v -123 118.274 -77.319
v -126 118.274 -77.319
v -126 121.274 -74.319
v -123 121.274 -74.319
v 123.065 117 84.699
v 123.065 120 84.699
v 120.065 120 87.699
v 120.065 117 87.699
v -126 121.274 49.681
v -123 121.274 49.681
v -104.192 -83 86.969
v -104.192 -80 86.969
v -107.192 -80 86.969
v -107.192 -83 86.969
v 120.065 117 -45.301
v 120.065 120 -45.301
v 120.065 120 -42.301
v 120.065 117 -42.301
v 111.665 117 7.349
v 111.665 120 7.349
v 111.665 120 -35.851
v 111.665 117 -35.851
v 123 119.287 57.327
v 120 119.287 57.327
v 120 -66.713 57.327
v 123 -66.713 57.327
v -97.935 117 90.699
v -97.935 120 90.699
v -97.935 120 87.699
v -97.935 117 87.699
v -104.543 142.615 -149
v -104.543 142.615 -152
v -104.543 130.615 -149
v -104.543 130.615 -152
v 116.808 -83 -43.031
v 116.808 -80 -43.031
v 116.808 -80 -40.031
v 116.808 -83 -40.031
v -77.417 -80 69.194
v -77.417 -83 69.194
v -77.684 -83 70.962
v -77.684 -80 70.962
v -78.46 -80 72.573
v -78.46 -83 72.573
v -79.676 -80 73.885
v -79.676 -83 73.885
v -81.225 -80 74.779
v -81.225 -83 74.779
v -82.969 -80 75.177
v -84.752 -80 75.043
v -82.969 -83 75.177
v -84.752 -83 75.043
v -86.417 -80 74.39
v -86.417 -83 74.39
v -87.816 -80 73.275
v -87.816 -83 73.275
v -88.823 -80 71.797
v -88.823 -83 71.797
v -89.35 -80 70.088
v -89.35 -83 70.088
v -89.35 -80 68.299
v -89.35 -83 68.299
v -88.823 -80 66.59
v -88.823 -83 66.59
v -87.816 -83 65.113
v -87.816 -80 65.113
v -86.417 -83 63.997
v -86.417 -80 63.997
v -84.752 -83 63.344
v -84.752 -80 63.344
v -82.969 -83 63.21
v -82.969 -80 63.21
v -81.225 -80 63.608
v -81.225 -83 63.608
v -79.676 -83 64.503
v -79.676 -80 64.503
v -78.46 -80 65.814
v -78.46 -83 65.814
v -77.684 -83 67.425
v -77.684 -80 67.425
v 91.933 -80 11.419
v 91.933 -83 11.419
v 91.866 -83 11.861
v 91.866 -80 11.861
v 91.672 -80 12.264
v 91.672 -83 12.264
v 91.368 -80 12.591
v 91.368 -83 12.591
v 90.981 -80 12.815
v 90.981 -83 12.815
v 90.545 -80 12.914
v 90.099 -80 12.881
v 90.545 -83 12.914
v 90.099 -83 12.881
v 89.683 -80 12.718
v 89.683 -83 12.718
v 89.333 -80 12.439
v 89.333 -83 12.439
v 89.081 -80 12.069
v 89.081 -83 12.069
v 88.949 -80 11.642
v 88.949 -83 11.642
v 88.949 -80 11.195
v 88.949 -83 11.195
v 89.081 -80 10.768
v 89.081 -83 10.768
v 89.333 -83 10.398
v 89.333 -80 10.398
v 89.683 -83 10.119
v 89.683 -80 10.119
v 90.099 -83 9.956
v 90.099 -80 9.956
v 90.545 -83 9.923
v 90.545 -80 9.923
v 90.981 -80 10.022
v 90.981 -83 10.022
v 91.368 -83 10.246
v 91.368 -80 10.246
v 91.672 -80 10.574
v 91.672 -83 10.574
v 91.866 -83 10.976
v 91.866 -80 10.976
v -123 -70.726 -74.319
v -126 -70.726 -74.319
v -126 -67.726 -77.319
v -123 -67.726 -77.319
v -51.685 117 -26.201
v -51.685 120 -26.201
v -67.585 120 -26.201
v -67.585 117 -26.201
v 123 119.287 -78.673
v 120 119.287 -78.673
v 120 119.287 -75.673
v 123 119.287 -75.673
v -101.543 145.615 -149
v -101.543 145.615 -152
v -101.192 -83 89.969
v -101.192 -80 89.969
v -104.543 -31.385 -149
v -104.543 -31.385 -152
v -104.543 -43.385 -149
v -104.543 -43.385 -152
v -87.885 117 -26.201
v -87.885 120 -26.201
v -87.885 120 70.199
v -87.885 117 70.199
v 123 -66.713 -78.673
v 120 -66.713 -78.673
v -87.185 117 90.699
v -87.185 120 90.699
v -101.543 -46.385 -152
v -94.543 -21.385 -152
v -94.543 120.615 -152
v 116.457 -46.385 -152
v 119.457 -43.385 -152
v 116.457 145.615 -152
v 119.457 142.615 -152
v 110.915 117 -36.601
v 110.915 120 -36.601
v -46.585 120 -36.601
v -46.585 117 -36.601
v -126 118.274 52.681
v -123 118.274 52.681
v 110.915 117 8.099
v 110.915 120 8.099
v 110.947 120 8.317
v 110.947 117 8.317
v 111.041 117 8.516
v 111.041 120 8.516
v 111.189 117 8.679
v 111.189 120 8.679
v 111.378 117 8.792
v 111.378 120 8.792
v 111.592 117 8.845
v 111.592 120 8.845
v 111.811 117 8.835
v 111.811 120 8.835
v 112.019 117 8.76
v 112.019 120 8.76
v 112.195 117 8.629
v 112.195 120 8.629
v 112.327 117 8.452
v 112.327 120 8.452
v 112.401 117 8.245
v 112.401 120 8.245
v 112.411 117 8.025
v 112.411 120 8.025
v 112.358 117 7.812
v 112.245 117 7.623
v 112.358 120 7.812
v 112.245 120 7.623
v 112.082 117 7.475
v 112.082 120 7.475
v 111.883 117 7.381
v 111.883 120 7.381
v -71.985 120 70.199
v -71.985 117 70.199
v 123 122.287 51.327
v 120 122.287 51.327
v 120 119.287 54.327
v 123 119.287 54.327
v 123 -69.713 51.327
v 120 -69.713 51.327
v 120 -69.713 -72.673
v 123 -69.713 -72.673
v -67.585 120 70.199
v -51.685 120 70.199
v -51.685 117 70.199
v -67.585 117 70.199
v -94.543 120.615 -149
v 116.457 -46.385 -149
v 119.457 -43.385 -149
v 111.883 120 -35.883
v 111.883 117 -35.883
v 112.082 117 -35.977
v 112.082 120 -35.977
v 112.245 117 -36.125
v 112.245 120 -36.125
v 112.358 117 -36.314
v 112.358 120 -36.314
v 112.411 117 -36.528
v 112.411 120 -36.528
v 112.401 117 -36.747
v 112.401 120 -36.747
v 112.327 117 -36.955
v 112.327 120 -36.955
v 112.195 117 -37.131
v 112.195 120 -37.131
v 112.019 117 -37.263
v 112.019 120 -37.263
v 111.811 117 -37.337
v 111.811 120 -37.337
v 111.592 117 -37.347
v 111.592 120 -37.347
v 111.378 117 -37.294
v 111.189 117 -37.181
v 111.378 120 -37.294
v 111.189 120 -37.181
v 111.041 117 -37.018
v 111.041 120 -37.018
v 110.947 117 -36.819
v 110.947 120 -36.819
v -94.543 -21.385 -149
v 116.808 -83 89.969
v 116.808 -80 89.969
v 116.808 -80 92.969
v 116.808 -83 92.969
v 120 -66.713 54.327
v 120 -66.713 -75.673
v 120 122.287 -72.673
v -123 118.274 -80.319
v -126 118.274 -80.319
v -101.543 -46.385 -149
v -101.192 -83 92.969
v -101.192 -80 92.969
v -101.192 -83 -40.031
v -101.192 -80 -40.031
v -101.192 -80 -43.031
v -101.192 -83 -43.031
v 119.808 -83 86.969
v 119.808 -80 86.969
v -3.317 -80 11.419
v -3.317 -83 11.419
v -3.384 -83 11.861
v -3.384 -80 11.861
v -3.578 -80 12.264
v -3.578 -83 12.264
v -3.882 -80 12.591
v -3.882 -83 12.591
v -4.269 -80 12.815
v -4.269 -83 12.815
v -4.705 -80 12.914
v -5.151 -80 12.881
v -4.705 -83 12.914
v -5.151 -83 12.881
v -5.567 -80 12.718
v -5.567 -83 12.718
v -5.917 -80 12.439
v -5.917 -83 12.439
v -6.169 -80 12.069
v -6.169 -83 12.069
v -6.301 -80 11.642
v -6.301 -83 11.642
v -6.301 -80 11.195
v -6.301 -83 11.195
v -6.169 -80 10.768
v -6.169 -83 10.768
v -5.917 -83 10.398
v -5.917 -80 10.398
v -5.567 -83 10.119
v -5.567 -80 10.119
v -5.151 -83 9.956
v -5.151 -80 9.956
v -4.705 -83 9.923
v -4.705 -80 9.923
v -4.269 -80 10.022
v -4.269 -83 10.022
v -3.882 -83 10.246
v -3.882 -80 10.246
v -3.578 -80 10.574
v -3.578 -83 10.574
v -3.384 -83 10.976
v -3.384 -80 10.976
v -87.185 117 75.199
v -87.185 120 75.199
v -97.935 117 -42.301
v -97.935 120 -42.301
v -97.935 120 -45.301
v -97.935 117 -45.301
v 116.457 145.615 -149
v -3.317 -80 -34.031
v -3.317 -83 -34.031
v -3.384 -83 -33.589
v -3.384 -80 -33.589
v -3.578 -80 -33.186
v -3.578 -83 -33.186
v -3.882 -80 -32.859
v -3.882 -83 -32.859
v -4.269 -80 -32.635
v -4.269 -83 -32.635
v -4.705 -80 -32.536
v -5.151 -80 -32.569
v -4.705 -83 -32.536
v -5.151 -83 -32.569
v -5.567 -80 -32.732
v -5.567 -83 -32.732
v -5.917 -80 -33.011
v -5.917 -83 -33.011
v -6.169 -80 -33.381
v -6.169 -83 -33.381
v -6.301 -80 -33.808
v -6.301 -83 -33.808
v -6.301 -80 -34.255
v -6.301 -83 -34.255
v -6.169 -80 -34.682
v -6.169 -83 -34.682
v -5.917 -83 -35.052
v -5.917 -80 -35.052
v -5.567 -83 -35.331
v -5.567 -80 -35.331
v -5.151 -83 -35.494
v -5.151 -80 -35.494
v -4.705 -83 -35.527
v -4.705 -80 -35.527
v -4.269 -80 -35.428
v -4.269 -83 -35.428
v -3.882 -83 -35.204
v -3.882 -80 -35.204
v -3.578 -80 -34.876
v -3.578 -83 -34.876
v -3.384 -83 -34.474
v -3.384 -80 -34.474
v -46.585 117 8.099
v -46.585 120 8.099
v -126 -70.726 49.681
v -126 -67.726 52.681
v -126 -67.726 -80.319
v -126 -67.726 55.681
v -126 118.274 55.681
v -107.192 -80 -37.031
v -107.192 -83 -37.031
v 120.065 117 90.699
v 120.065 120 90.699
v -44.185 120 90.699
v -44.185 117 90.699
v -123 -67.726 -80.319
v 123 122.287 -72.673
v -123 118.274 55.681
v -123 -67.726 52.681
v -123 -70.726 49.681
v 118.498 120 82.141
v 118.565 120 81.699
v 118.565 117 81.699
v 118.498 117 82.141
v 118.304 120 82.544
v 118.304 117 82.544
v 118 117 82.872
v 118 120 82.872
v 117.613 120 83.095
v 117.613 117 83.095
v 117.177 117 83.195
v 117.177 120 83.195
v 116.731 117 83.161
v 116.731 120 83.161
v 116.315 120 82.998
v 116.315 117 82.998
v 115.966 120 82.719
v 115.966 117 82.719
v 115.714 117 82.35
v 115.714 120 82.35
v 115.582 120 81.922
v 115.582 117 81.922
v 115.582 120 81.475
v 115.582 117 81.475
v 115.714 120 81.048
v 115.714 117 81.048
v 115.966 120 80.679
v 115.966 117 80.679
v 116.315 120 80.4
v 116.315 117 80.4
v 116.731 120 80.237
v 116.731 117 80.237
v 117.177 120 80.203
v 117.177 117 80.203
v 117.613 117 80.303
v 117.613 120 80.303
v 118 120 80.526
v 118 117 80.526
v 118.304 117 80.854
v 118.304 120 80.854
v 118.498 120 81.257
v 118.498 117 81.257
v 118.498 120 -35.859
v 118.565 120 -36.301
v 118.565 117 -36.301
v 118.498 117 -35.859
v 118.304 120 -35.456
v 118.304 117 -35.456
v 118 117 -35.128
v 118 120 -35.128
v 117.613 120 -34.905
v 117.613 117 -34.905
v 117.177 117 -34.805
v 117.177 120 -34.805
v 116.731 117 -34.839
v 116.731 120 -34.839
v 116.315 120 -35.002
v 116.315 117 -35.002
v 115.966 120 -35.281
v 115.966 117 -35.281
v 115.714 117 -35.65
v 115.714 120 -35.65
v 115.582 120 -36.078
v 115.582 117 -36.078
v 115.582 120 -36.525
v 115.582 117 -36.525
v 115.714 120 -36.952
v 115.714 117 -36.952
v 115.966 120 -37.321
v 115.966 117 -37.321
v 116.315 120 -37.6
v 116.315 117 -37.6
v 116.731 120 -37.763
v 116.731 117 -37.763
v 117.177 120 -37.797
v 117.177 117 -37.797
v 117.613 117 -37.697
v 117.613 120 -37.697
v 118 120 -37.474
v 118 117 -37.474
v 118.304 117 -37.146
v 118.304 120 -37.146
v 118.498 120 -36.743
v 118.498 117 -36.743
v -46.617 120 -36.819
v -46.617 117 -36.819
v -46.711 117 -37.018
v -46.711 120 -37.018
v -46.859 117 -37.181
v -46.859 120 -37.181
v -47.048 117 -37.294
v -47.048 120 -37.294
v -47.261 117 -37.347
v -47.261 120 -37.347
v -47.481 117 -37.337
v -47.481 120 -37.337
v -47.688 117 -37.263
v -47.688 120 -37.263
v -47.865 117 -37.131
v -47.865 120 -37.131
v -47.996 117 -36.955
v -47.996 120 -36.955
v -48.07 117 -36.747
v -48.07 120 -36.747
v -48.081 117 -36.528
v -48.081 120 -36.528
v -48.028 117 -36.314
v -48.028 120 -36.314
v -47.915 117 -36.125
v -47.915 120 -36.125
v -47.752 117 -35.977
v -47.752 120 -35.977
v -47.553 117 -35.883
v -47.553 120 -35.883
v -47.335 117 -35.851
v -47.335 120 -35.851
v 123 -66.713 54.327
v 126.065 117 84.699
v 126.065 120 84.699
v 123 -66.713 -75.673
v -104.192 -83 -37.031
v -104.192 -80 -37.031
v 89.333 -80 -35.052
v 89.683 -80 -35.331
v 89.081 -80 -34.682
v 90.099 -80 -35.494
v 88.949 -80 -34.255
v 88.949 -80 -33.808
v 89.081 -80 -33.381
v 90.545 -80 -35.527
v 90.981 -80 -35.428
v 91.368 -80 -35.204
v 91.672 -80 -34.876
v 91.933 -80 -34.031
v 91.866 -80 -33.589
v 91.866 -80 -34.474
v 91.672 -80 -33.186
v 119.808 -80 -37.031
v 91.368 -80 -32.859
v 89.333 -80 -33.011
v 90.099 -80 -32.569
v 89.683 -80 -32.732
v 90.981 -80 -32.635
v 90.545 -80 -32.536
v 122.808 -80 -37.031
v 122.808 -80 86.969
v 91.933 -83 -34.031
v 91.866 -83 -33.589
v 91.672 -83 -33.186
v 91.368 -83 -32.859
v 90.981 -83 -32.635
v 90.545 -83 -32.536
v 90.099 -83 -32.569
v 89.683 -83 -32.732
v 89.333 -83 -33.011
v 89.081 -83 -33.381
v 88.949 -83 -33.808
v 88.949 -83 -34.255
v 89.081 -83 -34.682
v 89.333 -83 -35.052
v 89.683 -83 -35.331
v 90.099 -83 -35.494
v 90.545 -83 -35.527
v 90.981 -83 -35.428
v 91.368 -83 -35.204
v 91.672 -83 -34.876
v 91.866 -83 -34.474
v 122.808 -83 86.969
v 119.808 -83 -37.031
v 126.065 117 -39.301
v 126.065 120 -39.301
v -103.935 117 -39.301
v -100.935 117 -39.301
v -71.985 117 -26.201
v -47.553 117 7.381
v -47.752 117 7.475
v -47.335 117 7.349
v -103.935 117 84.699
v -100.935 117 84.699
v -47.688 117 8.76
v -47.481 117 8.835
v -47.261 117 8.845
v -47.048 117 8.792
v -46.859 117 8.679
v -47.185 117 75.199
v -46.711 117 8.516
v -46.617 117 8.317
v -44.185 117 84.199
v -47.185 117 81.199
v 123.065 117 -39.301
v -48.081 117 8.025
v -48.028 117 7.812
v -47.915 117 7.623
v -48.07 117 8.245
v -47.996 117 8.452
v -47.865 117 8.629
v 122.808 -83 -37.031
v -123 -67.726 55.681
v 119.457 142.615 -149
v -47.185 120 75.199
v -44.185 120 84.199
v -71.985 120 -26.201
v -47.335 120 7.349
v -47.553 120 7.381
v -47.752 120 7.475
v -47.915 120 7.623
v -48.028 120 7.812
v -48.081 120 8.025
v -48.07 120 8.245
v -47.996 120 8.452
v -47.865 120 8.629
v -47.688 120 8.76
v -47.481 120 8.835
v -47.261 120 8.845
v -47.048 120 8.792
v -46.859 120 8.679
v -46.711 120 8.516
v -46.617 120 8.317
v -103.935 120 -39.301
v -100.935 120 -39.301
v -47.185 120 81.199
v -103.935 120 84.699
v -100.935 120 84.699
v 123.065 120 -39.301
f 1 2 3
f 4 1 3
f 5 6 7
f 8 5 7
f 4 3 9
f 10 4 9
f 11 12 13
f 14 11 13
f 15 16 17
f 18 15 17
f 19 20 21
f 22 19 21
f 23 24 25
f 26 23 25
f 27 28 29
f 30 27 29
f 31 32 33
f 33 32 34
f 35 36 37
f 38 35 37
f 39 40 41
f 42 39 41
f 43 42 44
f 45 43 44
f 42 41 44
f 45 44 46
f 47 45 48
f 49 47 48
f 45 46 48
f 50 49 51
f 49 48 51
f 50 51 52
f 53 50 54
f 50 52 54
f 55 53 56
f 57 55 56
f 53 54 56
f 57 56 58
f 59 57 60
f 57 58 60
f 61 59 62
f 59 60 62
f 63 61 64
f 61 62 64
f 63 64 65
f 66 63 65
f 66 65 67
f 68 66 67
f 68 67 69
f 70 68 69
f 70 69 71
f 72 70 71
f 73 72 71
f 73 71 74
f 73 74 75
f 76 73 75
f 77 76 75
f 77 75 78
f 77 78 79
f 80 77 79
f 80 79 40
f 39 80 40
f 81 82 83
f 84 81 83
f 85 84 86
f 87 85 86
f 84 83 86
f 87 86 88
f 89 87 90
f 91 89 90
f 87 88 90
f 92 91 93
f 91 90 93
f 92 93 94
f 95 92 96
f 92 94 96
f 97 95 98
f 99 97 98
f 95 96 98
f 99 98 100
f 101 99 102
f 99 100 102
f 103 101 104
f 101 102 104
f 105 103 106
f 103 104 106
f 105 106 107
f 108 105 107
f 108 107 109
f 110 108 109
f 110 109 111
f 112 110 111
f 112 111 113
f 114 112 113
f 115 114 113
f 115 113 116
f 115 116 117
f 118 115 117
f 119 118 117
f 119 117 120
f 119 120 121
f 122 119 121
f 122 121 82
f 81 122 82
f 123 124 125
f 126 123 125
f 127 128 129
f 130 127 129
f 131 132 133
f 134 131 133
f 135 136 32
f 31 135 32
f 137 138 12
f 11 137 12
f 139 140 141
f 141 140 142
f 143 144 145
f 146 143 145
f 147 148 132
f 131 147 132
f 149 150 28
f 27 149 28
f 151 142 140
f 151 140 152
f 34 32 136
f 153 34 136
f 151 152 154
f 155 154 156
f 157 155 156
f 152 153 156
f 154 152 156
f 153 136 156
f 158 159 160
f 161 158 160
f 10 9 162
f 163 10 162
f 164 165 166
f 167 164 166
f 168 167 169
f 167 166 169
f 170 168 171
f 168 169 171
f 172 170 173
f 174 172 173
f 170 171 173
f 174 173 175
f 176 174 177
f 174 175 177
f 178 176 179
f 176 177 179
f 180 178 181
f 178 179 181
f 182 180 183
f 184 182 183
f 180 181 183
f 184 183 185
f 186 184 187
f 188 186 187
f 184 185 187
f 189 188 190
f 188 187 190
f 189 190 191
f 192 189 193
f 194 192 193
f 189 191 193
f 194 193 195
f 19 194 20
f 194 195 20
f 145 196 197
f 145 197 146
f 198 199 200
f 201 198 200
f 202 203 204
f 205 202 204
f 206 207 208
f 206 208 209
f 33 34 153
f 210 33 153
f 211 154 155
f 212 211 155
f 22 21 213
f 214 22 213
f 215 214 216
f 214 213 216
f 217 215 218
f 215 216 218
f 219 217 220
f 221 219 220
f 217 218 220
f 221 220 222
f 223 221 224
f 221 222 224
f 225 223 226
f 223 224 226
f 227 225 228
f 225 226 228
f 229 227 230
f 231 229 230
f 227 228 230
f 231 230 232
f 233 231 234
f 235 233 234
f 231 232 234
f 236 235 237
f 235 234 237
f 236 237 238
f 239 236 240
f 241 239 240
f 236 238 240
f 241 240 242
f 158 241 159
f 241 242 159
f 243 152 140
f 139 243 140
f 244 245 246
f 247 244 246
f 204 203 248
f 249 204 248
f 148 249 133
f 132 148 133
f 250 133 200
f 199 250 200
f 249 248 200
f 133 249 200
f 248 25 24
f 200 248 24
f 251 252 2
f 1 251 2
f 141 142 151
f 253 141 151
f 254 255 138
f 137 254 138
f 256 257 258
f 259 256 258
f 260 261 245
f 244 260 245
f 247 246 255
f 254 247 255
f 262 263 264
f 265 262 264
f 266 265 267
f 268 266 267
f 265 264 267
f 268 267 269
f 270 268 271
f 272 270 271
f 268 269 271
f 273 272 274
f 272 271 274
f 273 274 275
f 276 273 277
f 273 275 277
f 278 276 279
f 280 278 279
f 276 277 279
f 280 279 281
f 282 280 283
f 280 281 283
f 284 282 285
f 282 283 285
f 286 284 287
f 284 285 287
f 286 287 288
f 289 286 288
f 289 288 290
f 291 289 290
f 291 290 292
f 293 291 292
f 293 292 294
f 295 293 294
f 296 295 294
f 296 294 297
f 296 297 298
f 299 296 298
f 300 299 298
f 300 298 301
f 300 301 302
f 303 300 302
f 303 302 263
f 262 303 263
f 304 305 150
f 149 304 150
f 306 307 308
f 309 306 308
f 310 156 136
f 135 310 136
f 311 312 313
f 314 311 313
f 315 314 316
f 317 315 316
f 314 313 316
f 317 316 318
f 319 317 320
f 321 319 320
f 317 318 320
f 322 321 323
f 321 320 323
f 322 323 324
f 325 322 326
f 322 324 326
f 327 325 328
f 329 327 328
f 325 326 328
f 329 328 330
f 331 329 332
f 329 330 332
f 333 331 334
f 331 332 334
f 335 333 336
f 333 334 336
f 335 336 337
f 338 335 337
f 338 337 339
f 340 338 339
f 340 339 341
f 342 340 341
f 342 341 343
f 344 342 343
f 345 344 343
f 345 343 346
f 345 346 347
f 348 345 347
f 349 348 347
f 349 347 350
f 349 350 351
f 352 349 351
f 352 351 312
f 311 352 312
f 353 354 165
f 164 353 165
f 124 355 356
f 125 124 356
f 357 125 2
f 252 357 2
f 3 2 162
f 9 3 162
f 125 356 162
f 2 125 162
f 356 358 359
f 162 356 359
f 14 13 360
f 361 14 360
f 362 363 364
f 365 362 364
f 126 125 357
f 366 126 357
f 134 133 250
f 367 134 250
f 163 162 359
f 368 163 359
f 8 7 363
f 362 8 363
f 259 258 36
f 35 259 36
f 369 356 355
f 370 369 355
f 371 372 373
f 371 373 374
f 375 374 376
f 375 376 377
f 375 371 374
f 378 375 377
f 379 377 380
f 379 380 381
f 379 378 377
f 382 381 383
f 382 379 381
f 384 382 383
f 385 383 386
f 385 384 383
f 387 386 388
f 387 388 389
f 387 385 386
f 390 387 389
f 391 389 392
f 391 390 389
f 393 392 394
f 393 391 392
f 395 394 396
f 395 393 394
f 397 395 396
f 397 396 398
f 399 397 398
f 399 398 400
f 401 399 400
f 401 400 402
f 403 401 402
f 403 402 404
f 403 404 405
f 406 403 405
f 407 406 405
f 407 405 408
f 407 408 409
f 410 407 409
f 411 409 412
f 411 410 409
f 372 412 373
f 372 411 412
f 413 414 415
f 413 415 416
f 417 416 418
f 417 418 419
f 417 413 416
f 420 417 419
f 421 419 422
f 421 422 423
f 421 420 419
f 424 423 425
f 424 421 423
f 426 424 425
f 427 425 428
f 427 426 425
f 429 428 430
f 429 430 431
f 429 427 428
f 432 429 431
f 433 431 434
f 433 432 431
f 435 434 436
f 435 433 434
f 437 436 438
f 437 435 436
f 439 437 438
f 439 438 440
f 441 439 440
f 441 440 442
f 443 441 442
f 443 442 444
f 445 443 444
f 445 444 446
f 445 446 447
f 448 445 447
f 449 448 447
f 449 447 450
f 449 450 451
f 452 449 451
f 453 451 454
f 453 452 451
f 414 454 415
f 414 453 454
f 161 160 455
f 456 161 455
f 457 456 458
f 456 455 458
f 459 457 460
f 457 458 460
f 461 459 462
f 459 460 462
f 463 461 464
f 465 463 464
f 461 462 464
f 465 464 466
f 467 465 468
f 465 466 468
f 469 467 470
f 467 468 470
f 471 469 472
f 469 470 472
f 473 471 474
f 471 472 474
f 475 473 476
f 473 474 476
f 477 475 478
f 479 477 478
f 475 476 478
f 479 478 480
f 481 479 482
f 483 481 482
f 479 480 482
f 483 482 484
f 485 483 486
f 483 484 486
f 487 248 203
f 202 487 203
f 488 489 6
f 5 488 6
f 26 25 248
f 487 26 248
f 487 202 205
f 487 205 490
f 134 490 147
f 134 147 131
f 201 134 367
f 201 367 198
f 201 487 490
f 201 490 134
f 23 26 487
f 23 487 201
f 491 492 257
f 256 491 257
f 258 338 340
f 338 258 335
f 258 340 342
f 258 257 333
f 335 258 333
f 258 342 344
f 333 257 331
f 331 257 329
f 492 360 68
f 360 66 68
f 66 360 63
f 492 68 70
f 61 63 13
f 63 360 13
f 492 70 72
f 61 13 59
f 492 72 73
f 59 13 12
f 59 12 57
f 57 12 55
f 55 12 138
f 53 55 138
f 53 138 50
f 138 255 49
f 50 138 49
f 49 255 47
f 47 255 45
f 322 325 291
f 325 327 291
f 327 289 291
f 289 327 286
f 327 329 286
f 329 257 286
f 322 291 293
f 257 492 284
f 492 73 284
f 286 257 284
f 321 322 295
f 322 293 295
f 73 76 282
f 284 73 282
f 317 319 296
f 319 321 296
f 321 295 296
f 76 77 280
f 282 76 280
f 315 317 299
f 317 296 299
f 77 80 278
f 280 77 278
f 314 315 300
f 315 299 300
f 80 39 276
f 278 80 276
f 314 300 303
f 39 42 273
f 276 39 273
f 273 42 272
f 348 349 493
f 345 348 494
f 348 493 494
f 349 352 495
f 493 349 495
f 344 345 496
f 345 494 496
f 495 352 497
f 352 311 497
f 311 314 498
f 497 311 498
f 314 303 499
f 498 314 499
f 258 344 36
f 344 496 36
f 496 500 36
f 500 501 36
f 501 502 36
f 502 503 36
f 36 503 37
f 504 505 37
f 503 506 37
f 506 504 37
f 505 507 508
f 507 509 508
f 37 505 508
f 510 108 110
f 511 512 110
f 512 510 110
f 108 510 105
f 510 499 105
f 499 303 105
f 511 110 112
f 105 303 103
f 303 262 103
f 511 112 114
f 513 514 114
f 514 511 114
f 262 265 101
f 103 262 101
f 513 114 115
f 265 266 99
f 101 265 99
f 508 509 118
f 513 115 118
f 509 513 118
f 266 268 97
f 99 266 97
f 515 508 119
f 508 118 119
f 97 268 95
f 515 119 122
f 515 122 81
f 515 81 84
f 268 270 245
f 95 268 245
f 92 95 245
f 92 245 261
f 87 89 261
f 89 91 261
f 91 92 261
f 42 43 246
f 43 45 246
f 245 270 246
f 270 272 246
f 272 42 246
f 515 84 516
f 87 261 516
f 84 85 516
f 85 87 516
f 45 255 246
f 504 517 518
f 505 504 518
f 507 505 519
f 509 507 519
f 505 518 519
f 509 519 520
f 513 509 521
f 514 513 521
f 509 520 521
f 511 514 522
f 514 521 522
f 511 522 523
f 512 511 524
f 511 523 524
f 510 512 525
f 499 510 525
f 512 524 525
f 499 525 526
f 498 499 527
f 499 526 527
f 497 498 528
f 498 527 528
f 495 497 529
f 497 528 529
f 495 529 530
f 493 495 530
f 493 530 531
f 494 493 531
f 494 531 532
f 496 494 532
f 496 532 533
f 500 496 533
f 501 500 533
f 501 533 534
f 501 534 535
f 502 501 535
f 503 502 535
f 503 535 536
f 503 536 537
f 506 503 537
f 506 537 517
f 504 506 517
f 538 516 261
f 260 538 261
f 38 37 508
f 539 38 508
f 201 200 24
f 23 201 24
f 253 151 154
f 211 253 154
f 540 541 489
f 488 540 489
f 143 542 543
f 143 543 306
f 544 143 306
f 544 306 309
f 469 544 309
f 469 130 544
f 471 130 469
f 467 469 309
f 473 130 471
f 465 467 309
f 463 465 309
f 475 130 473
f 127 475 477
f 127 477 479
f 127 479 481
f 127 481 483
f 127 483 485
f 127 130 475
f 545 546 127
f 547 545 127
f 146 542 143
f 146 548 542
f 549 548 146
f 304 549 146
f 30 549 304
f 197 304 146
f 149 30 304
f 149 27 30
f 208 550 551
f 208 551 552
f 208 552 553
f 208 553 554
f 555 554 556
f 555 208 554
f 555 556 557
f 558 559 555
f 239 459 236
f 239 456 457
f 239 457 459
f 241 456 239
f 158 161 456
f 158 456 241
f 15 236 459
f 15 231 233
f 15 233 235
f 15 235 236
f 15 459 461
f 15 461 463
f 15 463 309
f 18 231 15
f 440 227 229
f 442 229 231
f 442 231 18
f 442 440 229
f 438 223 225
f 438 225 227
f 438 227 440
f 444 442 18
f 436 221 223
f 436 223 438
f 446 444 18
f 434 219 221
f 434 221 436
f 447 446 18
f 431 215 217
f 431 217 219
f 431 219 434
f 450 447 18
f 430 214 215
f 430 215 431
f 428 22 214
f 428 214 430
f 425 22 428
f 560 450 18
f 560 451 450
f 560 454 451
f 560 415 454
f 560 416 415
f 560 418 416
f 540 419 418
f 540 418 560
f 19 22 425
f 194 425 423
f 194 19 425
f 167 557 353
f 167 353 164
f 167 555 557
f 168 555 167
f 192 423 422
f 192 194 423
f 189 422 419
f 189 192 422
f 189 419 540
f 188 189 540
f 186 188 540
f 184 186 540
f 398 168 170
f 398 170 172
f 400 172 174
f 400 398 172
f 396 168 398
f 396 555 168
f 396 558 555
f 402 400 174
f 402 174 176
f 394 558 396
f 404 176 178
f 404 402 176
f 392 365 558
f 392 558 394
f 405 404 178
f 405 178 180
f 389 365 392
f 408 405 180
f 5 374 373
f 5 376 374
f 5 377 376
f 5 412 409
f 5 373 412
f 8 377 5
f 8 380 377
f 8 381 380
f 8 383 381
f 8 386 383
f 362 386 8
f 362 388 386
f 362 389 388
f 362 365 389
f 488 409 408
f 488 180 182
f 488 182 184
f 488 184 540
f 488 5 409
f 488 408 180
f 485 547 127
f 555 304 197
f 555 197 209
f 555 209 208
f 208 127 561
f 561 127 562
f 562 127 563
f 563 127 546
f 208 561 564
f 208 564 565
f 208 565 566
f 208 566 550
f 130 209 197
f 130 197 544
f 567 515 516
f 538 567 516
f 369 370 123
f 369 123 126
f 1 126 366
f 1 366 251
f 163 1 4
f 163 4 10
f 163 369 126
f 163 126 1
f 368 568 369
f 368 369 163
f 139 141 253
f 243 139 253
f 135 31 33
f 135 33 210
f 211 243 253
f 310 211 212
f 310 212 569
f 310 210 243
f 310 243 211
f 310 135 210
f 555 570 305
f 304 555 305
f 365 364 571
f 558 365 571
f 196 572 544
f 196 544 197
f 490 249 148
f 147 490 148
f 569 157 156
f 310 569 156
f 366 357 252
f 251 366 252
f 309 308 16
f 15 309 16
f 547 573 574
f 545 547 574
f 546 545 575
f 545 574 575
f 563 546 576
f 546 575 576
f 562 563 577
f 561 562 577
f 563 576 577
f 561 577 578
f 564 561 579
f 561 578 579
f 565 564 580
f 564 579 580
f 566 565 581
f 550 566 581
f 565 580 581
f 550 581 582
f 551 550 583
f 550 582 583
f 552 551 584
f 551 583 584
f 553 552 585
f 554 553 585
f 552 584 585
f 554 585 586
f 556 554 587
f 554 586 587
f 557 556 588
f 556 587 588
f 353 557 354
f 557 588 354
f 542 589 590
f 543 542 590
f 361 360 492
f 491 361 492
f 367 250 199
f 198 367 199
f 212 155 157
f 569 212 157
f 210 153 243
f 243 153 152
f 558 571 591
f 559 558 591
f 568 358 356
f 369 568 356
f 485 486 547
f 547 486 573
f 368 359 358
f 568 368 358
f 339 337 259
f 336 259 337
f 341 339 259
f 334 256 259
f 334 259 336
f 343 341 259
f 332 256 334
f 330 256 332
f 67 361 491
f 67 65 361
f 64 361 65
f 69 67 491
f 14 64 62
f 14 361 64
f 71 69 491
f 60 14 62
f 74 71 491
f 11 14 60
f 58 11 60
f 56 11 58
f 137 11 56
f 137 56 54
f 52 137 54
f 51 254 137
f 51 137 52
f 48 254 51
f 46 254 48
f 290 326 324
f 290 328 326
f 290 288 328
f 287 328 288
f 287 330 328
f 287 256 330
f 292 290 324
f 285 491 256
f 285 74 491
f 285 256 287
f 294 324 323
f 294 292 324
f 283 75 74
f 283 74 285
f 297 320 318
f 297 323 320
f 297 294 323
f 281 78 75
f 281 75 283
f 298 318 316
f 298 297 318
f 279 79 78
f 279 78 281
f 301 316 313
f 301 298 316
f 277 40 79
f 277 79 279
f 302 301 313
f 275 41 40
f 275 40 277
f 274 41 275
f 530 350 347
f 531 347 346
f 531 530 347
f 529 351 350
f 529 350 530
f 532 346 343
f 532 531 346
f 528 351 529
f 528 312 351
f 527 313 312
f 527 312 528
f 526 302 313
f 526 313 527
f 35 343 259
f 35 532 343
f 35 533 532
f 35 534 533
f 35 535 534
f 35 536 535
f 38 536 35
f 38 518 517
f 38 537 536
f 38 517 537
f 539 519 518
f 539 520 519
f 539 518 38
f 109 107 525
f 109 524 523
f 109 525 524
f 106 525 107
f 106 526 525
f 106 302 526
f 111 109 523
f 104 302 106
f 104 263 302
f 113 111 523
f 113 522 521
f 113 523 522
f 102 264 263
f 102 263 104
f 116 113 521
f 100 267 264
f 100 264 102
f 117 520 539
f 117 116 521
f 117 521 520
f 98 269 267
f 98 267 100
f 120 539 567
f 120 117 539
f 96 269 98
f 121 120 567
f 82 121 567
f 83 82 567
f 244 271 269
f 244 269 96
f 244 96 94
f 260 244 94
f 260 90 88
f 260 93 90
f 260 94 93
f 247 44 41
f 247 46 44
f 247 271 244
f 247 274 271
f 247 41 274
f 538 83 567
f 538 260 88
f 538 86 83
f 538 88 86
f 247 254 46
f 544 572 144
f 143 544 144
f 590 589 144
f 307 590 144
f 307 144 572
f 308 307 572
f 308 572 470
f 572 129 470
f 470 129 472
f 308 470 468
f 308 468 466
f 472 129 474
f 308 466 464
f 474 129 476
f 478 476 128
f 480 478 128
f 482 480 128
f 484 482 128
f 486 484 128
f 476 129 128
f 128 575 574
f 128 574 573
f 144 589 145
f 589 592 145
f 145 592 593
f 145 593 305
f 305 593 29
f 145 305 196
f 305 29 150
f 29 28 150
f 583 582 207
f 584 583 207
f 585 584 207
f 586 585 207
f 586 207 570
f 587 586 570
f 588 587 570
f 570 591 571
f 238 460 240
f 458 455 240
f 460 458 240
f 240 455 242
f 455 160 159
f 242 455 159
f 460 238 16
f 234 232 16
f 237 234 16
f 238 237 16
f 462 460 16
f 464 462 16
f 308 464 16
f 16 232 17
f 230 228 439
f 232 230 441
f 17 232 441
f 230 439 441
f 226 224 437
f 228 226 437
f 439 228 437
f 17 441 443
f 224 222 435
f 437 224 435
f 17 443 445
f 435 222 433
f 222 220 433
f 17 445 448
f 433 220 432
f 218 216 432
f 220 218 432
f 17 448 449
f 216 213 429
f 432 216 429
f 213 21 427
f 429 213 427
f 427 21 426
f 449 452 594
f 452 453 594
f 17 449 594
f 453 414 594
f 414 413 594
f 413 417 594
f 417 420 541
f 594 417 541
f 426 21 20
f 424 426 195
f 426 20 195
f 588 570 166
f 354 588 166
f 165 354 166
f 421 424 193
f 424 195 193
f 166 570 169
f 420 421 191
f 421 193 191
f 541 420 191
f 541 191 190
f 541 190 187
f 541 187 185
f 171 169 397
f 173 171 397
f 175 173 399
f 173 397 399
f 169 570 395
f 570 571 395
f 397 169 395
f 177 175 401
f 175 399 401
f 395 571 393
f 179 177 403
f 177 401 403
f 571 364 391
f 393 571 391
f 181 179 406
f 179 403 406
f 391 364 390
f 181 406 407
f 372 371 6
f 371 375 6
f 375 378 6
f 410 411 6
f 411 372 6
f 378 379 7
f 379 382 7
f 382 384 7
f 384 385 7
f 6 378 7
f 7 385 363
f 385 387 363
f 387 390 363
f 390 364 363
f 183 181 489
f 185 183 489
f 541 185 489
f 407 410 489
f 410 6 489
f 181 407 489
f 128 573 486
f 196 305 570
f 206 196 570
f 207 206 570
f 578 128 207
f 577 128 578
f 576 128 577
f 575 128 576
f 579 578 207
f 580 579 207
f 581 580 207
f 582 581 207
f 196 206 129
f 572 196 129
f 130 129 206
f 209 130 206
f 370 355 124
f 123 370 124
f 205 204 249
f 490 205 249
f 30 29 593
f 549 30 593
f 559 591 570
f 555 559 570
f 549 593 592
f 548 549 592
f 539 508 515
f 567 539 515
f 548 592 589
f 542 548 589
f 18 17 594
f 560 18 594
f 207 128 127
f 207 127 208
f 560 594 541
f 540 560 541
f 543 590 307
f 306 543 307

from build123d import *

# Parameters (mm, degrees)
F2_DEPTH  = 3
F5_DEPTH  = 3
F7_R      = 1.5
F8_DEPTH  = 3
F11_DEPTH = 3
F14_DEPTH = 3
F15_R     = 1.5
F15_R_2   = 6
F16_DEPTH = 25
F17_W     = 15.9
F17_H     = 96.4
F18_DEPTH = 25
F20_DEPTH = 25


with BuildPart() as f2:
    # F1 (on offset) → F2 (new body)
    with BuildSketch(Plane.XZ.offset(80)):
        Polygon((116.807646, 92.968537), (-101.192354, 92.968537), (-101.192354, 89.968537), (-104.192354, 86.968537), (-107.192354, 86.968537), (-107.192354, -37.031463), (-104.192354, -37.031463), (-101.192354, -40.031463), (-101.192354, -43.031463), (116.807646, -43.031463), (116.807646, -40.031463), (119.807646, -37.031463), (122.807646, -37.031463), (122.807646, 86.968537), (119.807646, 86.968537), (116.807646, 89.968537), align=None)
    extrude(amount=F2_DEPTH)

    # F15 (on face) → F16 (cut)
    with BuildSketch(Plane.XZ.offset(83)):
        with Locations((-4.817354, -34.031463)):
            Circle(F15_R)
        with Locations((-4.817354, 11.418537)):
            Circle(F15_R)
        with Locations((90.432646, 11.418537)):
            Circle(F15_R)
        with Locations((90.432646, -34.031463)):
            Circle(F15_R)
        with Locations((-83.417354, 69.193537)):
            Circle(F15_R_2)
    extrude(amount=-F16_DEPTH, mode=Mode.SUBTRACT)


with BuildPart() as f5:
    # F4 (on offset) → F5 (new body)
    with BuildSketch(Plane.YZ.offset(120)):
        Polygon((119.286627, 57.326751), (-66.713373, 57.326751), (-66.713373, 54.326751), (-69.713373, 51.326751), (-69.713373, -72.673249), (-66.713373, -75.673249), (-66.713373, -78.673249), (119.286627, -78.673249), (119.286627, -75.673249), (122.286627, -72.673249), (122.286627, 51.326751), (119.286627, 54.326751), align=None)
    extrude(amount=F5_DEPTH)


with BuildPart() as f8:
    # F7 (on offset) → F8 (new body)
    with BuildSketch(Plane.XZ.offset(-120)):
        Polygon((120.065092, 87.698919), (120.065092, 90.698919), (-97.934908, 90.698919), (-97.934908, 87.698919), (-100.934908, 84.698919), (-103.934908, 84.698919), (-103.934908, -39.301081), (-100.934908, -39.301081), (-97.934908, -42.301081), (-97.934908, -45.301081), (120.065092, -45.301081), (120.065092, -42.301081), (123.065092, -39.301081), (126.065092, -39.301081), (126.065092, 84.698919), (123.065092, 84.698919), align=None)
        with Locations((117.065092, -36.301081)):
            Circle(F7_R, mode=Mode.SUBTRACT)
        with Locations((117.065092, 81.698919)):
            Circle(F7_R, mode=Mode.SUBTRACT)
    extrude(amount=F8_DEPTH)

    # F17 (on face) → F18 (cut)
    with BuildSketch(Plane(origin=(0, 120, 0), x_dir=(-1, 0, 0), z_dir=(0, 1, 0))):
        with Locations((59.634908, 21.998919)):
            Rectangle(F17_W, F17_H)
        with Locations((79.934908, 21.998919)):
            Rectangle(F17_W, F17_H)
        Polygon((-110.915092, 8.098919), (-111.665092, 8.098919), (-111.665092, 7.348919), (-111.665092, -35.851081), (-111.665092, -36.601081), (-110.915092, -36.601081), (46.584908, -36.601081), (47.334908, -36.601081), (47.334908, -35.851081), (47.334908, 7.348919), (47.334908, 8.098919), (46.584908, 8.098919), align=None)
        with BuildLine():
            Line((-111.665092, 7.348919), (-111.665092, 8.098919))
            Line((-111.665092, 8.098919), (-110.915092, 8.098919))
            ThreePointArc((-110.915092, 8.098919), (-112.195422, 8.629249), (-111.665092, 7.348919))
        make_face()
        with BuildLine():
            Line((-111.665092, -36.601081), (-111.665092, -35.851081))
            ThreePointArc((-111.665092, -35.851081), (-112.195422, -37.131411), (-110.915092, -36.601081))
            Line((-110.915092, -36.601081), (-111.665092, -36.601081))
        make_face()
        with BuildLine():
            ThreePointArc((47.334908, 7.348919), (47.865238, 8.629249), (46.584908, 8.098919))
            Line((46.584908, 8.098919), (47.334908, 8.098919))
            Line((47.334908, 8.098919), (47.334908, 7.348919))
        make_face()
        with BuildLine():
            Line((47.334908, -36.601081), (46.584908, -36.601081))
            ThreePointArc((46.584908, -36.601081), (47.865238, -37.131411), (47.334908, -35.851081))
            Line((47.334908, -35.851081), (47.334908, -36.601081))
        make_face()
        Polygon((47.184908, 81.198919), (47.184908, 75.198919), (87.184908, 75.198919), (87.184908, 90.698919), (44.184908, 90.698919), (44.184908, 84.198919), align=None)
    extrude(amount=-F18_DEPTH, mode=Mode.SUBTRACT)


with BuildPart() as f11:
    # F10 (on offset) → F11 (new body)
    with BuildSketch(Plane.YZ.offset(-126)):
        Polygon((118.273727, 55.680823), (-67.726273, 55.680823), (-67.726273, 52.680823), (-70.726273, 49.680823), (-70.726273, -74.319177), (-67.726273, -77.319177), (-67.726273, -80.319177), (118.273727, -80.319177), (118.273727, -77.319177), (121.273727, -74.319177), (121.273727, 49.680823), (118.273727, 52.680823), align=None)
    extrude(amount=F11_DEPTH)


with BuildPart() as f14:
    # F13 (on offset) → F14 (new body)
    with BuildSketch(Plane.XY.offset(-152)):
        Polygon((-104.542598, -43.385352), (-101.542598, -46.385352), (116.457402, -46.385352), (119.457402, -43.385352), (119.457402, 142.614648), (116.457402, 145.614648), (-101.542598, 145.614648), (-104.542598, 142.614648), align=None)
    extrude(amount=F14_DEPTH)

    # F19 (on face) → F20 (cut)
    with BuildSketch(Plane(origin=(0, 0, -152), x_dir=(1, 0, 0), z_dir=(0, 0, -1))):
        Polygon((-94.542598, 21.385352), (-104.542598, 31.385352), (-104.542598, -130.614648), (-94.542598, -120.614648), align=None)
    extrude(amount=-F20_DEPTH, mode=Mode.SUBTRACT)


solid = Compound([f2.part, f5.part, f8.part, f11.part, f14.part])
